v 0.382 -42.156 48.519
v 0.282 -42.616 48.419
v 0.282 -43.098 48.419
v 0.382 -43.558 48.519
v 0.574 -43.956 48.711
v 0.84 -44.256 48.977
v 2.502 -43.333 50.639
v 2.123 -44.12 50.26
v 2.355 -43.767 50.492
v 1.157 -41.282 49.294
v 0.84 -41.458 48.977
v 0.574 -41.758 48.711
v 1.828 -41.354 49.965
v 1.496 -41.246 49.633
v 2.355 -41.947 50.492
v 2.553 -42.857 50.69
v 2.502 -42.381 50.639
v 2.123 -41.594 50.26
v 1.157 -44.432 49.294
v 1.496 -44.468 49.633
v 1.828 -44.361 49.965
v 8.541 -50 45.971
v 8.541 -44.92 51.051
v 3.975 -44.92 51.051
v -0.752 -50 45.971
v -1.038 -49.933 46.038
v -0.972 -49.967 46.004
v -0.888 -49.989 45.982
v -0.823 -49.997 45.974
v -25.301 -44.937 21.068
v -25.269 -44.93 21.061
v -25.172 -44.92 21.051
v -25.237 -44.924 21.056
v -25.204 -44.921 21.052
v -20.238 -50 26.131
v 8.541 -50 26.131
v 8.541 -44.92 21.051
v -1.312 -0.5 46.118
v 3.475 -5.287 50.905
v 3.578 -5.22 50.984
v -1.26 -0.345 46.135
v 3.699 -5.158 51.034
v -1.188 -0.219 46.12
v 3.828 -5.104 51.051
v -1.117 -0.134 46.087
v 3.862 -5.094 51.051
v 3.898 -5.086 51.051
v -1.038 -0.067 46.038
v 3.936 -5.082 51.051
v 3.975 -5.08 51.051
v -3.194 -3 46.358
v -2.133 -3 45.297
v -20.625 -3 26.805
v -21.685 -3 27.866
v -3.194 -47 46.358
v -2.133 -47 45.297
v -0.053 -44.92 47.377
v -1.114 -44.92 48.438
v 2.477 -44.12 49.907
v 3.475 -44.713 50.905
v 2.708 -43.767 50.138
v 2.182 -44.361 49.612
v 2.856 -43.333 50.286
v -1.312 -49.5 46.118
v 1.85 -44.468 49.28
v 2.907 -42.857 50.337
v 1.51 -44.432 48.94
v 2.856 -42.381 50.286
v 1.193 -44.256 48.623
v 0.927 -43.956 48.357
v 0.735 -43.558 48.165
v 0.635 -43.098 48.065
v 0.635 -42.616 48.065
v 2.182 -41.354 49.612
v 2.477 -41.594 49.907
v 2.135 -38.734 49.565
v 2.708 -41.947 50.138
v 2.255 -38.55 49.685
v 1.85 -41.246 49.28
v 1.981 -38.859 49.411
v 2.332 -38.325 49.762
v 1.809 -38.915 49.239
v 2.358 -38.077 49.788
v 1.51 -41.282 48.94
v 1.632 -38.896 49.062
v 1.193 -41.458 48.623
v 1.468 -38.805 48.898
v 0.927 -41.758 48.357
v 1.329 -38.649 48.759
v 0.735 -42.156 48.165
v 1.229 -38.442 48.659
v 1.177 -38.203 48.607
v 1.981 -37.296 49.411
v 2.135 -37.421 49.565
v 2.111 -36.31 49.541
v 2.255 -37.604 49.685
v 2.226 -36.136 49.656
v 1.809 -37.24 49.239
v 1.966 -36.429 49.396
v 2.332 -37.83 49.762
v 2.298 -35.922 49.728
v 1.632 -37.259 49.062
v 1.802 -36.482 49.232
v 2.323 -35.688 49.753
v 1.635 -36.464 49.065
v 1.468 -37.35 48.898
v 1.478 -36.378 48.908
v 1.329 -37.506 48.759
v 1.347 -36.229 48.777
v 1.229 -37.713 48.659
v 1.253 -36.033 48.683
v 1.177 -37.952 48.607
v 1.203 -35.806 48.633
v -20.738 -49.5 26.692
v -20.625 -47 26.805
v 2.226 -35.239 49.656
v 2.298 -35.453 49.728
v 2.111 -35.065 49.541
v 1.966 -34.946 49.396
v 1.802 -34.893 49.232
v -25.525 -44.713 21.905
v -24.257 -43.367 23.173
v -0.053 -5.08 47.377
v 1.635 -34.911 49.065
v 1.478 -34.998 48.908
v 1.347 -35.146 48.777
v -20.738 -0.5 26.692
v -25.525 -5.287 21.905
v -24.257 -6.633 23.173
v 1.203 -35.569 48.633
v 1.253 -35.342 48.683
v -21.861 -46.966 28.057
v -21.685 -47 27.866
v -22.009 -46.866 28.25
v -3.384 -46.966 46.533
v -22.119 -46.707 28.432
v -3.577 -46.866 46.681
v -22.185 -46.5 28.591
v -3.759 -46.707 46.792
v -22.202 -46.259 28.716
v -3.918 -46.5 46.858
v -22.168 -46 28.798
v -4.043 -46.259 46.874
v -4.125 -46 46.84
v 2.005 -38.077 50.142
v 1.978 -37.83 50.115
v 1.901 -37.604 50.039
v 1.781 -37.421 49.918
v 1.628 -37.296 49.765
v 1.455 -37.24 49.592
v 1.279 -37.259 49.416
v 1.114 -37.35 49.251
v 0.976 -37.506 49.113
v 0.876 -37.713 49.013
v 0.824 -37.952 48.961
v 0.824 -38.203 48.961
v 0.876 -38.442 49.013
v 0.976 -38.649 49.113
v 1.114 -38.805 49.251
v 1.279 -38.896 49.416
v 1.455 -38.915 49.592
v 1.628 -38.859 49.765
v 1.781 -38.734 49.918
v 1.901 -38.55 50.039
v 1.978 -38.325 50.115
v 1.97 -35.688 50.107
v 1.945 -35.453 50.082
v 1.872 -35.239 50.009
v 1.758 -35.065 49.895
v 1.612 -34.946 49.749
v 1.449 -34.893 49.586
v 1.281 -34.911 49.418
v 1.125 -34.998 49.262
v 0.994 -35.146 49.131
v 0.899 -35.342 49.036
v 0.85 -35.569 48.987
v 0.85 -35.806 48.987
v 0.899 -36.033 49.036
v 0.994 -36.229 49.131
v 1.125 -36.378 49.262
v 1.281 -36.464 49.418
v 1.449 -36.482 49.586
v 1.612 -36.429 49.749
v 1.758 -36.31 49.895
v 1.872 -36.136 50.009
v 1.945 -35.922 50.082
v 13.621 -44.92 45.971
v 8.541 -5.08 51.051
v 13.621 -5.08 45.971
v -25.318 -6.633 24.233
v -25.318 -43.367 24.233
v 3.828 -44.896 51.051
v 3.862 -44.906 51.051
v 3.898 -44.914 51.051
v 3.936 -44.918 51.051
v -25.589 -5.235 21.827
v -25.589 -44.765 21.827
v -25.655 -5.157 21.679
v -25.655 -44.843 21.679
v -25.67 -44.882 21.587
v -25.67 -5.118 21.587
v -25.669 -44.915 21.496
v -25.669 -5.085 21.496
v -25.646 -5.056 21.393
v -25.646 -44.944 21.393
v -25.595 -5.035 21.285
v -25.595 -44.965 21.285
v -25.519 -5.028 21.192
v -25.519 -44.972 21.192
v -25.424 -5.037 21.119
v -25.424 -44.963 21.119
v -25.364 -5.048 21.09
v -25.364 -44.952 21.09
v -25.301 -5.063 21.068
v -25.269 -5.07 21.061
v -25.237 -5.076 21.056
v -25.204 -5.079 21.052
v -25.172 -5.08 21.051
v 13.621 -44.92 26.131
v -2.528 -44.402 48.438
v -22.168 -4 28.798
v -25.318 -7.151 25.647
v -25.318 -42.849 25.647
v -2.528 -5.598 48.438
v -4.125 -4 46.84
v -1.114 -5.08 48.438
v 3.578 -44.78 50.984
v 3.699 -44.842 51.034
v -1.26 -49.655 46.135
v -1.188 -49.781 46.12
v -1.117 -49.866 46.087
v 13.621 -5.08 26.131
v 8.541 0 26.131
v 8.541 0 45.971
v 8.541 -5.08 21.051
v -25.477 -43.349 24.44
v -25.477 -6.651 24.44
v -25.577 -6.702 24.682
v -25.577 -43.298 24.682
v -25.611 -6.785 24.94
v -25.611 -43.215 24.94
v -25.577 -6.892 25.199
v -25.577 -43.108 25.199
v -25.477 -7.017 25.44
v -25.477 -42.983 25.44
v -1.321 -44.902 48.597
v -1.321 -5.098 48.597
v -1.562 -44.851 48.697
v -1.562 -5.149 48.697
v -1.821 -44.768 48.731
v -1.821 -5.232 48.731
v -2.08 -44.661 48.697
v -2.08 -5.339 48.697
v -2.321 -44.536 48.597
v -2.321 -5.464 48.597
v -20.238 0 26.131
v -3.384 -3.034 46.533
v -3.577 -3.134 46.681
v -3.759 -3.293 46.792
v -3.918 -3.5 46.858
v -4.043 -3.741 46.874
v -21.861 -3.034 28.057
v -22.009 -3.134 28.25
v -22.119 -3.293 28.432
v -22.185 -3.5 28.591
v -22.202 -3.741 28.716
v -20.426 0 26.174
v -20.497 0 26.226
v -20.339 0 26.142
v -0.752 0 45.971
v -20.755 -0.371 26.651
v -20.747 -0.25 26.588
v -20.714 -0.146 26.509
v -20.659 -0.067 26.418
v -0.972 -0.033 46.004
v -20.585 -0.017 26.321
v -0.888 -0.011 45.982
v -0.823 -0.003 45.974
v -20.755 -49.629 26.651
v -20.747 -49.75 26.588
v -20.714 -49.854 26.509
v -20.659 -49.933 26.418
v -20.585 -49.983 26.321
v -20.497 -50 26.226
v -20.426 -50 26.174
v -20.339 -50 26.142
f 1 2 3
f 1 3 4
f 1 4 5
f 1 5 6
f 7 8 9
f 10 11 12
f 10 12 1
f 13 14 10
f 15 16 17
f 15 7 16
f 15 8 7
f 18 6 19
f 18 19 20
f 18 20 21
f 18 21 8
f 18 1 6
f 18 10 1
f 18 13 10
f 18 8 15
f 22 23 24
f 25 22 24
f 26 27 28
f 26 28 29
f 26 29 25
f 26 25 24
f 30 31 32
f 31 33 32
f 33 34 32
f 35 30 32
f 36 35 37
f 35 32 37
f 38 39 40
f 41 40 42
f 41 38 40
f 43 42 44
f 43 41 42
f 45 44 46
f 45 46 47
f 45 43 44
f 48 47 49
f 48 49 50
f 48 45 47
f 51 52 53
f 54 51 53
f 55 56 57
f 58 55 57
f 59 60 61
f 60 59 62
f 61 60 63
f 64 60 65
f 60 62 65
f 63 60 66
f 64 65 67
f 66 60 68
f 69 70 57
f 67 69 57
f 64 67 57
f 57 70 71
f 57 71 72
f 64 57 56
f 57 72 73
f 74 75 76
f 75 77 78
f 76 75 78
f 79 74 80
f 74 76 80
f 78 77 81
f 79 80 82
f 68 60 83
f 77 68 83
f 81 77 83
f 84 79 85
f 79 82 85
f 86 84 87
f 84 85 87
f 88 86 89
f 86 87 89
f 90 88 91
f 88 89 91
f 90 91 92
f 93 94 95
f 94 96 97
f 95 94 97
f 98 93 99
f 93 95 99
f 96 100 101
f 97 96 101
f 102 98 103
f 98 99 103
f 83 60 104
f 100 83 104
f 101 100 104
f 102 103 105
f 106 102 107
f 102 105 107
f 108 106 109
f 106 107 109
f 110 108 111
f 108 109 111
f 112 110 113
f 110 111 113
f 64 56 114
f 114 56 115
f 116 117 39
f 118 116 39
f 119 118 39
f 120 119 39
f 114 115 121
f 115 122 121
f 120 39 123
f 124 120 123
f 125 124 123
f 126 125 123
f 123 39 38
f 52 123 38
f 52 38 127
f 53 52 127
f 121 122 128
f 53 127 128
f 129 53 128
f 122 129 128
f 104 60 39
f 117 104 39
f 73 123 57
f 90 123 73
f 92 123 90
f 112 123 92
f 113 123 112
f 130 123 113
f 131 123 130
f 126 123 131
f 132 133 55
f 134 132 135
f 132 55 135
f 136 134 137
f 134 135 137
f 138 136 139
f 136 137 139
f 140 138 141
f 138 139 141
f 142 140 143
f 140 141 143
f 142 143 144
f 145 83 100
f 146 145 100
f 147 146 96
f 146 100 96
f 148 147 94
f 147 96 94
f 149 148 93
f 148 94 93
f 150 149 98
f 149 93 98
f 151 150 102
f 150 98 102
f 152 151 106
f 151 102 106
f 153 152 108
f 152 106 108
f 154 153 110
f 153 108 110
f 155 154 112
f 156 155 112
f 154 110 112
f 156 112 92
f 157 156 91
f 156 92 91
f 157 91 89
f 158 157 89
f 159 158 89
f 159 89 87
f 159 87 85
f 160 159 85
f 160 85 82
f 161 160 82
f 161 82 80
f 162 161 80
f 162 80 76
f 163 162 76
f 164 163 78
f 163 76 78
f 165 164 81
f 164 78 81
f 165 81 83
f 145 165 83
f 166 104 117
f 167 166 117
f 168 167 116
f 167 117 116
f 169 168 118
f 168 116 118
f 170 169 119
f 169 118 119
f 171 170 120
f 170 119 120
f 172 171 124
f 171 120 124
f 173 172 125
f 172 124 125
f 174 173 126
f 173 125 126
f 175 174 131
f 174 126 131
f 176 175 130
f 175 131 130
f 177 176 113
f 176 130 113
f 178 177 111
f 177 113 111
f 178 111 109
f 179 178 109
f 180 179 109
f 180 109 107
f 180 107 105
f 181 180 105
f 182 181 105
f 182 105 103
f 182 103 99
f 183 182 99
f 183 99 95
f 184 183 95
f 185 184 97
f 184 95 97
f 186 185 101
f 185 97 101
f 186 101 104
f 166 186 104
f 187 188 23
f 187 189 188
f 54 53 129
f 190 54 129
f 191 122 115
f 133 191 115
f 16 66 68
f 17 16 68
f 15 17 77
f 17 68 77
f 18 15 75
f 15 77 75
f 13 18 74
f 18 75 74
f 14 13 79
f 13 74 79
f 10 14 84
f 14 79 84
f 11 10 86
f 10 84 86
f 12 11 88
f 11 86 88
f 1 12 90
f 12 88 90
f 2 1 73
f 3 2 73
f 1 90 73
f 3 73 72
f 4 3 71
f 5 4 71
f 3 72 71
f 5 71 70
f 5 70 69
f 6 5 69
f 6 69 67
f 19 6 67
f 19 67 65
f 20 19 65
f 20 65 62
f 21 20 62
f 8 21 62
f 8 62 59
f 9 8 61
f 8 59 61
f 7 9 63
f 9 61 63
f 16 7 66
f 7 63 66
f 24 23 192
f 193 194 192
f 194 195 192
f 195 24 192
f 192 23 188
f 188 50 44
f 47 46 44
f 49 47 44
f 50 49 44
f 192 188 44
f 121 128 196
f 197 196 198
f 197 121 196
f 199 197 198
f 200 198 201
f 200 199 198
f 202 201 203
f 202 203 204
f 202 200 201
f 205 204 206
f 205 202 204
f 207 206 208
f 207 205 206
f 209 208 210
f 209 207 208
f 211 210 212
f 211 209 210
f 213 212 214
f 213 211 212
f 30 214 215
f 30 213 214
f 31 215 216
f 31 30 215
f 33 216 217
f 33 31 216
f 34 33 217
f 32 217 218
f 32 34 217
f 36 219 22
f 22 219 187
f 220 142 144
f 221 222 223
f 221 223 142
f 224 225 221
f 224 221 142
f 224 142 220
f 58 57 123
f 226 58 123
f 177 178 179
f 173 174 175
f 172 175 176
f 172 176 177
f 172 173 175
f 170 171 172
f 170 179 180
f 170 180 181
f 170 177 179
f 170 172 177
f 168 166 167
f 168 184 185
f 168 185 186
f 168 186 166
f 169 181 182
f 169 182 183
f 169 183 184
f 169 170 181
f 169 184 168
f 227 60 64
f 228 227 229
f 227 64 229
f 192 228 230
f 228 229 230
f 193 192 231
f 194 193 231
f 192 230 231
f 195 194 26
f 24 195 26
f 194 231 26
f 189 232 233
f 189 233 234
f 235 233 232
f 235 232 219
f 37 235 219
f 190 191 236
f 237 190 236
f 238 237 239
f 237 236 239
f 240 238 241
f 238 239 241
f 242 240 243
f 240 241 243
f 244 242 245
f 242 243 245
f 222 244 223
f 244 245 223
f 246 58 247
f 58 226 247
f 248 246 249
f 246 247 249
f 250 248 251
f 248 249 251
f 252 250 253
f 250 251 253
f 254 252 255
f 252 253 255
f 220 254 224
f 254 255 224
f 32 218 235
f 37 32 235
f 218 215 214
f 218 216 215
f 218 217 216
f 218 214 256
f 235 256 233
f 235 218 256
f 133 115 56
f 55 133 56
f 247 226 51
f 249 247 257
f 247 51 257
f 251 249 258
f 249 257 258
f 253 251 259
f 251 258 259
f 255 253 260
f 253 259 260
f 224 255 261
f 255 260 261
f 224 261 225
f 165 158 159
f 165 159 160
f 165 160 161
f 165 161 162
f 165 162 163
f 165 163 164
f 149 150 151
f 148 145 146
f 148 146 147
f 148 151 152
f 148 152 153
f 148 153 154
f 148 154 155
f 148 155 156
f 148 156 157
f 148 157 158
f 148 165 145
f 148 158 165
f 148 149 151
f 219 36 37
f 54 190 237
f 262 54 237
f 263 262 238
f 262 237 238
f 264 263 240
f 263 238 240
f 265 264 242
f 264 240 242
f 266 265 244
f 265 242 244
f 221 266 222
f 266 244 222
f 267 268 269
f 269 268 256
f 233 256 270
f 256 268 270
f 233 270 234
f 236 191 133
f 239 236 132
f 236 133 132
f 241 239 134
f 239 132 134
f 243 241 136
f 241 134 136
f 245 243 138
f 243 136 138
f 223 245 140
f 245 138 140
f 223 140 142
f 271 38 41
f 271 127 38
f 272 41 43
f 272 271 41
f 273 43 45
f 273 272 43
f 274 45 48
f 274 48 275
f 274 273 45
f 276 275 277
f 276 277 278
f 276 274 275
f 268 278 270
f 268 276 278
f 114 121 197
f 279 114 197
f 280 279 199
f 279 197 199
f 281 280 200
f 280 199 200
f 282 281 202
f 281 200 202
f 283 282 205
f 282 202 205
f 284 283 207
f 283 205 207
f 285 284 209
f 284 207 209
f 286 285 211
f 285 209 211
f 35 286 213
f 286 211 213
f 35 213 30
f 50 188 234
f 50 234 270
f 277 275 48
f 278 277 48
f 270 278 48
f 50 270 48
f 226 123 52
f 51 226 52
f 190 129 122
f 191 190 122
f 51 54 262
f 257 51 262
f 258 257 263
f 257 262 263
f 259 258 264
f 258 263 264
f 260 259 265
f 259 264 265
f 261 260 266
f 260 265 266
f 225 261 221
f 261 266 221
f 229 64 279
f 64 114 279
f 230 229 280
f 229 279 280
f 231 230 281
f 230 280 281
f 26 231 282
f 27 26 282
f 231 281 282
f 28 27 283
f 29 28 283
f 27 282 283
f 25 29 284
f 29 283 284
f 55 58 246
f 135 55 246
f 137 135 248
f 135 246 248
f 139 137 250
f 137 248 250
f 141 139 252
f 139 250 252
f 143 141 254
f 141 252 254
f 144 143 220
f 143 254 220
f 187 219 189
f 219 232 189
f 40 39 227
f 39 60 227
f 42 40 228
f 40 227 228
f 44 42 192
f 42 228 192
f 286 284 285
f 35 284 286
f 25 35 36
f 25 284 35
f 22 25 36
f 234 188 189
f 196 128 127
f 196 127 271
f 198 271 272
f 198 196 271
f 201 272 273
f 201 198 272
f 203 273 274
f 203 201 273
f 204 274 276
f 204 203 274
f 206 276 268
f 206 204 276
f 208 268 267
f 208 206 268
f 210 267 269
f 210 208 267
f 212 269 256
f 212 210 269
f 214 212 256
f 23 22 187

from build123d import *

# Parameters (mm, degrees)
F1_DEPTH = 50
F3_DEPTH = 2.5
F4_R     = 1
F5_R     = 1.6151714505
F5_R_2   = 0.8396882265
F5_R_3   = 0.796597451
F6_DEPTH = 0.5
F7_SIZE  = 5.08
F8_R     = 0.5


with BuildPart() as f1:
    # F0 (on Front) → F1 (new body)
    with BuildSketch(Plane.XZ):
        Polygon((3.6212546234, 51.0512575135), (-26.3787453766, 21.0512575135), (13.6212546234, 21.0512575135), (13.6212546234, 51.0512575135), align=None)
    extrude(amount=F1_DEPTH)

    # F2 (on face) → F3 (join)
    with BuildSketch(Plane(origin=(-23.715001445, 0, 23.715001445), x_dir=(0.7071067812, 0, 0.7071067812), z_dir=(-0.7071067812, 0, 0.7071067812))):
        Polygon((30.521587444, -47), (33.4631516538, -44.92), (33.4631516538, -5.08), (30.521587444, -3), (4.3706138377, -3), (-0.7671027947, -6.6329142706), (-0.7671027947, -43.3670857294), (4.3706138377, -47), align=None)
    extrude(amount=F3_DEPTH)

    # F4
    f4_edges = [f1.edges().sort_by_distance(p)[0] for p in [
        (-13.146512, -3, 37.819024),
        (-2.860747, -45.96, 48.10479),
        (-1.820747, -25, 49.14479),
        (-2.860747, -4.04, 48.10479),
        (-24.208735, -4.816457, 26.756802),
        (-26.025192, -25, 24.940345),
        (-24.208735, -45.183543, 26.756802),
        (-13.146512, -47, 37.819024),
    ]]
    fillet(f4_edges, radius=F4_R)

    # F5 (on face) → F6 (join)
    with BuildSketch(Plane(origin=(-23.715001445, 0, 23.715001445), x_dir=(0.7071067812, 0, 0.7071067812), z_dir=(-0.7071067812, 0, 0.7071067812))):
        with Locations((36.0333621502, -42.8570471704)):
            Circle(F5_R)
        with Locations((36.0333621502, -38.0774661899)):
            Circle(F5_R_2)
        with Locations((36.0272766753, -35.6876738369)):
            Circle(F5_R_3)
    extrude(amount=F6_DEPTH)

    # F7
    f7_edges = [f1.edges().sort_by_distance(p)[0] for p in [
        (-6.378745, 0, 21.051258),
        (-6.378745, -50, 21.051258),
        (8.621255, -50, 51.051258),
        (13.621255, -50, 36.051258),
        (13.621255, -25, 51.051258),
        (8.621255, 0, 51.051258),
        (13.621255, 0, 36.051258),
        (13.621255, -25, 21.051258),
    ]]
    chamfer(f7_edges, length=F7_SIZE)

    # F8
    f8_edges = [f1.edges().sort_by_distance(p)[0] for p in [
        (-26.378745, -25, 21.051258),
        (-23.838745, -2.54, 23.591258),
        (-11.378745, 0, 36.051258),
        (-23.838745, -47.46, 23.591258),
        (-11.378745, -50, 36.051258),
        (1.081255, -47.46, 48.511258),
        (3.621255, -25, 51.051258),
        (1.081255, -2.54, 48.511258),
    ]]
    fillet(f8_edges, radius=F8_R)


solid = f1.part
